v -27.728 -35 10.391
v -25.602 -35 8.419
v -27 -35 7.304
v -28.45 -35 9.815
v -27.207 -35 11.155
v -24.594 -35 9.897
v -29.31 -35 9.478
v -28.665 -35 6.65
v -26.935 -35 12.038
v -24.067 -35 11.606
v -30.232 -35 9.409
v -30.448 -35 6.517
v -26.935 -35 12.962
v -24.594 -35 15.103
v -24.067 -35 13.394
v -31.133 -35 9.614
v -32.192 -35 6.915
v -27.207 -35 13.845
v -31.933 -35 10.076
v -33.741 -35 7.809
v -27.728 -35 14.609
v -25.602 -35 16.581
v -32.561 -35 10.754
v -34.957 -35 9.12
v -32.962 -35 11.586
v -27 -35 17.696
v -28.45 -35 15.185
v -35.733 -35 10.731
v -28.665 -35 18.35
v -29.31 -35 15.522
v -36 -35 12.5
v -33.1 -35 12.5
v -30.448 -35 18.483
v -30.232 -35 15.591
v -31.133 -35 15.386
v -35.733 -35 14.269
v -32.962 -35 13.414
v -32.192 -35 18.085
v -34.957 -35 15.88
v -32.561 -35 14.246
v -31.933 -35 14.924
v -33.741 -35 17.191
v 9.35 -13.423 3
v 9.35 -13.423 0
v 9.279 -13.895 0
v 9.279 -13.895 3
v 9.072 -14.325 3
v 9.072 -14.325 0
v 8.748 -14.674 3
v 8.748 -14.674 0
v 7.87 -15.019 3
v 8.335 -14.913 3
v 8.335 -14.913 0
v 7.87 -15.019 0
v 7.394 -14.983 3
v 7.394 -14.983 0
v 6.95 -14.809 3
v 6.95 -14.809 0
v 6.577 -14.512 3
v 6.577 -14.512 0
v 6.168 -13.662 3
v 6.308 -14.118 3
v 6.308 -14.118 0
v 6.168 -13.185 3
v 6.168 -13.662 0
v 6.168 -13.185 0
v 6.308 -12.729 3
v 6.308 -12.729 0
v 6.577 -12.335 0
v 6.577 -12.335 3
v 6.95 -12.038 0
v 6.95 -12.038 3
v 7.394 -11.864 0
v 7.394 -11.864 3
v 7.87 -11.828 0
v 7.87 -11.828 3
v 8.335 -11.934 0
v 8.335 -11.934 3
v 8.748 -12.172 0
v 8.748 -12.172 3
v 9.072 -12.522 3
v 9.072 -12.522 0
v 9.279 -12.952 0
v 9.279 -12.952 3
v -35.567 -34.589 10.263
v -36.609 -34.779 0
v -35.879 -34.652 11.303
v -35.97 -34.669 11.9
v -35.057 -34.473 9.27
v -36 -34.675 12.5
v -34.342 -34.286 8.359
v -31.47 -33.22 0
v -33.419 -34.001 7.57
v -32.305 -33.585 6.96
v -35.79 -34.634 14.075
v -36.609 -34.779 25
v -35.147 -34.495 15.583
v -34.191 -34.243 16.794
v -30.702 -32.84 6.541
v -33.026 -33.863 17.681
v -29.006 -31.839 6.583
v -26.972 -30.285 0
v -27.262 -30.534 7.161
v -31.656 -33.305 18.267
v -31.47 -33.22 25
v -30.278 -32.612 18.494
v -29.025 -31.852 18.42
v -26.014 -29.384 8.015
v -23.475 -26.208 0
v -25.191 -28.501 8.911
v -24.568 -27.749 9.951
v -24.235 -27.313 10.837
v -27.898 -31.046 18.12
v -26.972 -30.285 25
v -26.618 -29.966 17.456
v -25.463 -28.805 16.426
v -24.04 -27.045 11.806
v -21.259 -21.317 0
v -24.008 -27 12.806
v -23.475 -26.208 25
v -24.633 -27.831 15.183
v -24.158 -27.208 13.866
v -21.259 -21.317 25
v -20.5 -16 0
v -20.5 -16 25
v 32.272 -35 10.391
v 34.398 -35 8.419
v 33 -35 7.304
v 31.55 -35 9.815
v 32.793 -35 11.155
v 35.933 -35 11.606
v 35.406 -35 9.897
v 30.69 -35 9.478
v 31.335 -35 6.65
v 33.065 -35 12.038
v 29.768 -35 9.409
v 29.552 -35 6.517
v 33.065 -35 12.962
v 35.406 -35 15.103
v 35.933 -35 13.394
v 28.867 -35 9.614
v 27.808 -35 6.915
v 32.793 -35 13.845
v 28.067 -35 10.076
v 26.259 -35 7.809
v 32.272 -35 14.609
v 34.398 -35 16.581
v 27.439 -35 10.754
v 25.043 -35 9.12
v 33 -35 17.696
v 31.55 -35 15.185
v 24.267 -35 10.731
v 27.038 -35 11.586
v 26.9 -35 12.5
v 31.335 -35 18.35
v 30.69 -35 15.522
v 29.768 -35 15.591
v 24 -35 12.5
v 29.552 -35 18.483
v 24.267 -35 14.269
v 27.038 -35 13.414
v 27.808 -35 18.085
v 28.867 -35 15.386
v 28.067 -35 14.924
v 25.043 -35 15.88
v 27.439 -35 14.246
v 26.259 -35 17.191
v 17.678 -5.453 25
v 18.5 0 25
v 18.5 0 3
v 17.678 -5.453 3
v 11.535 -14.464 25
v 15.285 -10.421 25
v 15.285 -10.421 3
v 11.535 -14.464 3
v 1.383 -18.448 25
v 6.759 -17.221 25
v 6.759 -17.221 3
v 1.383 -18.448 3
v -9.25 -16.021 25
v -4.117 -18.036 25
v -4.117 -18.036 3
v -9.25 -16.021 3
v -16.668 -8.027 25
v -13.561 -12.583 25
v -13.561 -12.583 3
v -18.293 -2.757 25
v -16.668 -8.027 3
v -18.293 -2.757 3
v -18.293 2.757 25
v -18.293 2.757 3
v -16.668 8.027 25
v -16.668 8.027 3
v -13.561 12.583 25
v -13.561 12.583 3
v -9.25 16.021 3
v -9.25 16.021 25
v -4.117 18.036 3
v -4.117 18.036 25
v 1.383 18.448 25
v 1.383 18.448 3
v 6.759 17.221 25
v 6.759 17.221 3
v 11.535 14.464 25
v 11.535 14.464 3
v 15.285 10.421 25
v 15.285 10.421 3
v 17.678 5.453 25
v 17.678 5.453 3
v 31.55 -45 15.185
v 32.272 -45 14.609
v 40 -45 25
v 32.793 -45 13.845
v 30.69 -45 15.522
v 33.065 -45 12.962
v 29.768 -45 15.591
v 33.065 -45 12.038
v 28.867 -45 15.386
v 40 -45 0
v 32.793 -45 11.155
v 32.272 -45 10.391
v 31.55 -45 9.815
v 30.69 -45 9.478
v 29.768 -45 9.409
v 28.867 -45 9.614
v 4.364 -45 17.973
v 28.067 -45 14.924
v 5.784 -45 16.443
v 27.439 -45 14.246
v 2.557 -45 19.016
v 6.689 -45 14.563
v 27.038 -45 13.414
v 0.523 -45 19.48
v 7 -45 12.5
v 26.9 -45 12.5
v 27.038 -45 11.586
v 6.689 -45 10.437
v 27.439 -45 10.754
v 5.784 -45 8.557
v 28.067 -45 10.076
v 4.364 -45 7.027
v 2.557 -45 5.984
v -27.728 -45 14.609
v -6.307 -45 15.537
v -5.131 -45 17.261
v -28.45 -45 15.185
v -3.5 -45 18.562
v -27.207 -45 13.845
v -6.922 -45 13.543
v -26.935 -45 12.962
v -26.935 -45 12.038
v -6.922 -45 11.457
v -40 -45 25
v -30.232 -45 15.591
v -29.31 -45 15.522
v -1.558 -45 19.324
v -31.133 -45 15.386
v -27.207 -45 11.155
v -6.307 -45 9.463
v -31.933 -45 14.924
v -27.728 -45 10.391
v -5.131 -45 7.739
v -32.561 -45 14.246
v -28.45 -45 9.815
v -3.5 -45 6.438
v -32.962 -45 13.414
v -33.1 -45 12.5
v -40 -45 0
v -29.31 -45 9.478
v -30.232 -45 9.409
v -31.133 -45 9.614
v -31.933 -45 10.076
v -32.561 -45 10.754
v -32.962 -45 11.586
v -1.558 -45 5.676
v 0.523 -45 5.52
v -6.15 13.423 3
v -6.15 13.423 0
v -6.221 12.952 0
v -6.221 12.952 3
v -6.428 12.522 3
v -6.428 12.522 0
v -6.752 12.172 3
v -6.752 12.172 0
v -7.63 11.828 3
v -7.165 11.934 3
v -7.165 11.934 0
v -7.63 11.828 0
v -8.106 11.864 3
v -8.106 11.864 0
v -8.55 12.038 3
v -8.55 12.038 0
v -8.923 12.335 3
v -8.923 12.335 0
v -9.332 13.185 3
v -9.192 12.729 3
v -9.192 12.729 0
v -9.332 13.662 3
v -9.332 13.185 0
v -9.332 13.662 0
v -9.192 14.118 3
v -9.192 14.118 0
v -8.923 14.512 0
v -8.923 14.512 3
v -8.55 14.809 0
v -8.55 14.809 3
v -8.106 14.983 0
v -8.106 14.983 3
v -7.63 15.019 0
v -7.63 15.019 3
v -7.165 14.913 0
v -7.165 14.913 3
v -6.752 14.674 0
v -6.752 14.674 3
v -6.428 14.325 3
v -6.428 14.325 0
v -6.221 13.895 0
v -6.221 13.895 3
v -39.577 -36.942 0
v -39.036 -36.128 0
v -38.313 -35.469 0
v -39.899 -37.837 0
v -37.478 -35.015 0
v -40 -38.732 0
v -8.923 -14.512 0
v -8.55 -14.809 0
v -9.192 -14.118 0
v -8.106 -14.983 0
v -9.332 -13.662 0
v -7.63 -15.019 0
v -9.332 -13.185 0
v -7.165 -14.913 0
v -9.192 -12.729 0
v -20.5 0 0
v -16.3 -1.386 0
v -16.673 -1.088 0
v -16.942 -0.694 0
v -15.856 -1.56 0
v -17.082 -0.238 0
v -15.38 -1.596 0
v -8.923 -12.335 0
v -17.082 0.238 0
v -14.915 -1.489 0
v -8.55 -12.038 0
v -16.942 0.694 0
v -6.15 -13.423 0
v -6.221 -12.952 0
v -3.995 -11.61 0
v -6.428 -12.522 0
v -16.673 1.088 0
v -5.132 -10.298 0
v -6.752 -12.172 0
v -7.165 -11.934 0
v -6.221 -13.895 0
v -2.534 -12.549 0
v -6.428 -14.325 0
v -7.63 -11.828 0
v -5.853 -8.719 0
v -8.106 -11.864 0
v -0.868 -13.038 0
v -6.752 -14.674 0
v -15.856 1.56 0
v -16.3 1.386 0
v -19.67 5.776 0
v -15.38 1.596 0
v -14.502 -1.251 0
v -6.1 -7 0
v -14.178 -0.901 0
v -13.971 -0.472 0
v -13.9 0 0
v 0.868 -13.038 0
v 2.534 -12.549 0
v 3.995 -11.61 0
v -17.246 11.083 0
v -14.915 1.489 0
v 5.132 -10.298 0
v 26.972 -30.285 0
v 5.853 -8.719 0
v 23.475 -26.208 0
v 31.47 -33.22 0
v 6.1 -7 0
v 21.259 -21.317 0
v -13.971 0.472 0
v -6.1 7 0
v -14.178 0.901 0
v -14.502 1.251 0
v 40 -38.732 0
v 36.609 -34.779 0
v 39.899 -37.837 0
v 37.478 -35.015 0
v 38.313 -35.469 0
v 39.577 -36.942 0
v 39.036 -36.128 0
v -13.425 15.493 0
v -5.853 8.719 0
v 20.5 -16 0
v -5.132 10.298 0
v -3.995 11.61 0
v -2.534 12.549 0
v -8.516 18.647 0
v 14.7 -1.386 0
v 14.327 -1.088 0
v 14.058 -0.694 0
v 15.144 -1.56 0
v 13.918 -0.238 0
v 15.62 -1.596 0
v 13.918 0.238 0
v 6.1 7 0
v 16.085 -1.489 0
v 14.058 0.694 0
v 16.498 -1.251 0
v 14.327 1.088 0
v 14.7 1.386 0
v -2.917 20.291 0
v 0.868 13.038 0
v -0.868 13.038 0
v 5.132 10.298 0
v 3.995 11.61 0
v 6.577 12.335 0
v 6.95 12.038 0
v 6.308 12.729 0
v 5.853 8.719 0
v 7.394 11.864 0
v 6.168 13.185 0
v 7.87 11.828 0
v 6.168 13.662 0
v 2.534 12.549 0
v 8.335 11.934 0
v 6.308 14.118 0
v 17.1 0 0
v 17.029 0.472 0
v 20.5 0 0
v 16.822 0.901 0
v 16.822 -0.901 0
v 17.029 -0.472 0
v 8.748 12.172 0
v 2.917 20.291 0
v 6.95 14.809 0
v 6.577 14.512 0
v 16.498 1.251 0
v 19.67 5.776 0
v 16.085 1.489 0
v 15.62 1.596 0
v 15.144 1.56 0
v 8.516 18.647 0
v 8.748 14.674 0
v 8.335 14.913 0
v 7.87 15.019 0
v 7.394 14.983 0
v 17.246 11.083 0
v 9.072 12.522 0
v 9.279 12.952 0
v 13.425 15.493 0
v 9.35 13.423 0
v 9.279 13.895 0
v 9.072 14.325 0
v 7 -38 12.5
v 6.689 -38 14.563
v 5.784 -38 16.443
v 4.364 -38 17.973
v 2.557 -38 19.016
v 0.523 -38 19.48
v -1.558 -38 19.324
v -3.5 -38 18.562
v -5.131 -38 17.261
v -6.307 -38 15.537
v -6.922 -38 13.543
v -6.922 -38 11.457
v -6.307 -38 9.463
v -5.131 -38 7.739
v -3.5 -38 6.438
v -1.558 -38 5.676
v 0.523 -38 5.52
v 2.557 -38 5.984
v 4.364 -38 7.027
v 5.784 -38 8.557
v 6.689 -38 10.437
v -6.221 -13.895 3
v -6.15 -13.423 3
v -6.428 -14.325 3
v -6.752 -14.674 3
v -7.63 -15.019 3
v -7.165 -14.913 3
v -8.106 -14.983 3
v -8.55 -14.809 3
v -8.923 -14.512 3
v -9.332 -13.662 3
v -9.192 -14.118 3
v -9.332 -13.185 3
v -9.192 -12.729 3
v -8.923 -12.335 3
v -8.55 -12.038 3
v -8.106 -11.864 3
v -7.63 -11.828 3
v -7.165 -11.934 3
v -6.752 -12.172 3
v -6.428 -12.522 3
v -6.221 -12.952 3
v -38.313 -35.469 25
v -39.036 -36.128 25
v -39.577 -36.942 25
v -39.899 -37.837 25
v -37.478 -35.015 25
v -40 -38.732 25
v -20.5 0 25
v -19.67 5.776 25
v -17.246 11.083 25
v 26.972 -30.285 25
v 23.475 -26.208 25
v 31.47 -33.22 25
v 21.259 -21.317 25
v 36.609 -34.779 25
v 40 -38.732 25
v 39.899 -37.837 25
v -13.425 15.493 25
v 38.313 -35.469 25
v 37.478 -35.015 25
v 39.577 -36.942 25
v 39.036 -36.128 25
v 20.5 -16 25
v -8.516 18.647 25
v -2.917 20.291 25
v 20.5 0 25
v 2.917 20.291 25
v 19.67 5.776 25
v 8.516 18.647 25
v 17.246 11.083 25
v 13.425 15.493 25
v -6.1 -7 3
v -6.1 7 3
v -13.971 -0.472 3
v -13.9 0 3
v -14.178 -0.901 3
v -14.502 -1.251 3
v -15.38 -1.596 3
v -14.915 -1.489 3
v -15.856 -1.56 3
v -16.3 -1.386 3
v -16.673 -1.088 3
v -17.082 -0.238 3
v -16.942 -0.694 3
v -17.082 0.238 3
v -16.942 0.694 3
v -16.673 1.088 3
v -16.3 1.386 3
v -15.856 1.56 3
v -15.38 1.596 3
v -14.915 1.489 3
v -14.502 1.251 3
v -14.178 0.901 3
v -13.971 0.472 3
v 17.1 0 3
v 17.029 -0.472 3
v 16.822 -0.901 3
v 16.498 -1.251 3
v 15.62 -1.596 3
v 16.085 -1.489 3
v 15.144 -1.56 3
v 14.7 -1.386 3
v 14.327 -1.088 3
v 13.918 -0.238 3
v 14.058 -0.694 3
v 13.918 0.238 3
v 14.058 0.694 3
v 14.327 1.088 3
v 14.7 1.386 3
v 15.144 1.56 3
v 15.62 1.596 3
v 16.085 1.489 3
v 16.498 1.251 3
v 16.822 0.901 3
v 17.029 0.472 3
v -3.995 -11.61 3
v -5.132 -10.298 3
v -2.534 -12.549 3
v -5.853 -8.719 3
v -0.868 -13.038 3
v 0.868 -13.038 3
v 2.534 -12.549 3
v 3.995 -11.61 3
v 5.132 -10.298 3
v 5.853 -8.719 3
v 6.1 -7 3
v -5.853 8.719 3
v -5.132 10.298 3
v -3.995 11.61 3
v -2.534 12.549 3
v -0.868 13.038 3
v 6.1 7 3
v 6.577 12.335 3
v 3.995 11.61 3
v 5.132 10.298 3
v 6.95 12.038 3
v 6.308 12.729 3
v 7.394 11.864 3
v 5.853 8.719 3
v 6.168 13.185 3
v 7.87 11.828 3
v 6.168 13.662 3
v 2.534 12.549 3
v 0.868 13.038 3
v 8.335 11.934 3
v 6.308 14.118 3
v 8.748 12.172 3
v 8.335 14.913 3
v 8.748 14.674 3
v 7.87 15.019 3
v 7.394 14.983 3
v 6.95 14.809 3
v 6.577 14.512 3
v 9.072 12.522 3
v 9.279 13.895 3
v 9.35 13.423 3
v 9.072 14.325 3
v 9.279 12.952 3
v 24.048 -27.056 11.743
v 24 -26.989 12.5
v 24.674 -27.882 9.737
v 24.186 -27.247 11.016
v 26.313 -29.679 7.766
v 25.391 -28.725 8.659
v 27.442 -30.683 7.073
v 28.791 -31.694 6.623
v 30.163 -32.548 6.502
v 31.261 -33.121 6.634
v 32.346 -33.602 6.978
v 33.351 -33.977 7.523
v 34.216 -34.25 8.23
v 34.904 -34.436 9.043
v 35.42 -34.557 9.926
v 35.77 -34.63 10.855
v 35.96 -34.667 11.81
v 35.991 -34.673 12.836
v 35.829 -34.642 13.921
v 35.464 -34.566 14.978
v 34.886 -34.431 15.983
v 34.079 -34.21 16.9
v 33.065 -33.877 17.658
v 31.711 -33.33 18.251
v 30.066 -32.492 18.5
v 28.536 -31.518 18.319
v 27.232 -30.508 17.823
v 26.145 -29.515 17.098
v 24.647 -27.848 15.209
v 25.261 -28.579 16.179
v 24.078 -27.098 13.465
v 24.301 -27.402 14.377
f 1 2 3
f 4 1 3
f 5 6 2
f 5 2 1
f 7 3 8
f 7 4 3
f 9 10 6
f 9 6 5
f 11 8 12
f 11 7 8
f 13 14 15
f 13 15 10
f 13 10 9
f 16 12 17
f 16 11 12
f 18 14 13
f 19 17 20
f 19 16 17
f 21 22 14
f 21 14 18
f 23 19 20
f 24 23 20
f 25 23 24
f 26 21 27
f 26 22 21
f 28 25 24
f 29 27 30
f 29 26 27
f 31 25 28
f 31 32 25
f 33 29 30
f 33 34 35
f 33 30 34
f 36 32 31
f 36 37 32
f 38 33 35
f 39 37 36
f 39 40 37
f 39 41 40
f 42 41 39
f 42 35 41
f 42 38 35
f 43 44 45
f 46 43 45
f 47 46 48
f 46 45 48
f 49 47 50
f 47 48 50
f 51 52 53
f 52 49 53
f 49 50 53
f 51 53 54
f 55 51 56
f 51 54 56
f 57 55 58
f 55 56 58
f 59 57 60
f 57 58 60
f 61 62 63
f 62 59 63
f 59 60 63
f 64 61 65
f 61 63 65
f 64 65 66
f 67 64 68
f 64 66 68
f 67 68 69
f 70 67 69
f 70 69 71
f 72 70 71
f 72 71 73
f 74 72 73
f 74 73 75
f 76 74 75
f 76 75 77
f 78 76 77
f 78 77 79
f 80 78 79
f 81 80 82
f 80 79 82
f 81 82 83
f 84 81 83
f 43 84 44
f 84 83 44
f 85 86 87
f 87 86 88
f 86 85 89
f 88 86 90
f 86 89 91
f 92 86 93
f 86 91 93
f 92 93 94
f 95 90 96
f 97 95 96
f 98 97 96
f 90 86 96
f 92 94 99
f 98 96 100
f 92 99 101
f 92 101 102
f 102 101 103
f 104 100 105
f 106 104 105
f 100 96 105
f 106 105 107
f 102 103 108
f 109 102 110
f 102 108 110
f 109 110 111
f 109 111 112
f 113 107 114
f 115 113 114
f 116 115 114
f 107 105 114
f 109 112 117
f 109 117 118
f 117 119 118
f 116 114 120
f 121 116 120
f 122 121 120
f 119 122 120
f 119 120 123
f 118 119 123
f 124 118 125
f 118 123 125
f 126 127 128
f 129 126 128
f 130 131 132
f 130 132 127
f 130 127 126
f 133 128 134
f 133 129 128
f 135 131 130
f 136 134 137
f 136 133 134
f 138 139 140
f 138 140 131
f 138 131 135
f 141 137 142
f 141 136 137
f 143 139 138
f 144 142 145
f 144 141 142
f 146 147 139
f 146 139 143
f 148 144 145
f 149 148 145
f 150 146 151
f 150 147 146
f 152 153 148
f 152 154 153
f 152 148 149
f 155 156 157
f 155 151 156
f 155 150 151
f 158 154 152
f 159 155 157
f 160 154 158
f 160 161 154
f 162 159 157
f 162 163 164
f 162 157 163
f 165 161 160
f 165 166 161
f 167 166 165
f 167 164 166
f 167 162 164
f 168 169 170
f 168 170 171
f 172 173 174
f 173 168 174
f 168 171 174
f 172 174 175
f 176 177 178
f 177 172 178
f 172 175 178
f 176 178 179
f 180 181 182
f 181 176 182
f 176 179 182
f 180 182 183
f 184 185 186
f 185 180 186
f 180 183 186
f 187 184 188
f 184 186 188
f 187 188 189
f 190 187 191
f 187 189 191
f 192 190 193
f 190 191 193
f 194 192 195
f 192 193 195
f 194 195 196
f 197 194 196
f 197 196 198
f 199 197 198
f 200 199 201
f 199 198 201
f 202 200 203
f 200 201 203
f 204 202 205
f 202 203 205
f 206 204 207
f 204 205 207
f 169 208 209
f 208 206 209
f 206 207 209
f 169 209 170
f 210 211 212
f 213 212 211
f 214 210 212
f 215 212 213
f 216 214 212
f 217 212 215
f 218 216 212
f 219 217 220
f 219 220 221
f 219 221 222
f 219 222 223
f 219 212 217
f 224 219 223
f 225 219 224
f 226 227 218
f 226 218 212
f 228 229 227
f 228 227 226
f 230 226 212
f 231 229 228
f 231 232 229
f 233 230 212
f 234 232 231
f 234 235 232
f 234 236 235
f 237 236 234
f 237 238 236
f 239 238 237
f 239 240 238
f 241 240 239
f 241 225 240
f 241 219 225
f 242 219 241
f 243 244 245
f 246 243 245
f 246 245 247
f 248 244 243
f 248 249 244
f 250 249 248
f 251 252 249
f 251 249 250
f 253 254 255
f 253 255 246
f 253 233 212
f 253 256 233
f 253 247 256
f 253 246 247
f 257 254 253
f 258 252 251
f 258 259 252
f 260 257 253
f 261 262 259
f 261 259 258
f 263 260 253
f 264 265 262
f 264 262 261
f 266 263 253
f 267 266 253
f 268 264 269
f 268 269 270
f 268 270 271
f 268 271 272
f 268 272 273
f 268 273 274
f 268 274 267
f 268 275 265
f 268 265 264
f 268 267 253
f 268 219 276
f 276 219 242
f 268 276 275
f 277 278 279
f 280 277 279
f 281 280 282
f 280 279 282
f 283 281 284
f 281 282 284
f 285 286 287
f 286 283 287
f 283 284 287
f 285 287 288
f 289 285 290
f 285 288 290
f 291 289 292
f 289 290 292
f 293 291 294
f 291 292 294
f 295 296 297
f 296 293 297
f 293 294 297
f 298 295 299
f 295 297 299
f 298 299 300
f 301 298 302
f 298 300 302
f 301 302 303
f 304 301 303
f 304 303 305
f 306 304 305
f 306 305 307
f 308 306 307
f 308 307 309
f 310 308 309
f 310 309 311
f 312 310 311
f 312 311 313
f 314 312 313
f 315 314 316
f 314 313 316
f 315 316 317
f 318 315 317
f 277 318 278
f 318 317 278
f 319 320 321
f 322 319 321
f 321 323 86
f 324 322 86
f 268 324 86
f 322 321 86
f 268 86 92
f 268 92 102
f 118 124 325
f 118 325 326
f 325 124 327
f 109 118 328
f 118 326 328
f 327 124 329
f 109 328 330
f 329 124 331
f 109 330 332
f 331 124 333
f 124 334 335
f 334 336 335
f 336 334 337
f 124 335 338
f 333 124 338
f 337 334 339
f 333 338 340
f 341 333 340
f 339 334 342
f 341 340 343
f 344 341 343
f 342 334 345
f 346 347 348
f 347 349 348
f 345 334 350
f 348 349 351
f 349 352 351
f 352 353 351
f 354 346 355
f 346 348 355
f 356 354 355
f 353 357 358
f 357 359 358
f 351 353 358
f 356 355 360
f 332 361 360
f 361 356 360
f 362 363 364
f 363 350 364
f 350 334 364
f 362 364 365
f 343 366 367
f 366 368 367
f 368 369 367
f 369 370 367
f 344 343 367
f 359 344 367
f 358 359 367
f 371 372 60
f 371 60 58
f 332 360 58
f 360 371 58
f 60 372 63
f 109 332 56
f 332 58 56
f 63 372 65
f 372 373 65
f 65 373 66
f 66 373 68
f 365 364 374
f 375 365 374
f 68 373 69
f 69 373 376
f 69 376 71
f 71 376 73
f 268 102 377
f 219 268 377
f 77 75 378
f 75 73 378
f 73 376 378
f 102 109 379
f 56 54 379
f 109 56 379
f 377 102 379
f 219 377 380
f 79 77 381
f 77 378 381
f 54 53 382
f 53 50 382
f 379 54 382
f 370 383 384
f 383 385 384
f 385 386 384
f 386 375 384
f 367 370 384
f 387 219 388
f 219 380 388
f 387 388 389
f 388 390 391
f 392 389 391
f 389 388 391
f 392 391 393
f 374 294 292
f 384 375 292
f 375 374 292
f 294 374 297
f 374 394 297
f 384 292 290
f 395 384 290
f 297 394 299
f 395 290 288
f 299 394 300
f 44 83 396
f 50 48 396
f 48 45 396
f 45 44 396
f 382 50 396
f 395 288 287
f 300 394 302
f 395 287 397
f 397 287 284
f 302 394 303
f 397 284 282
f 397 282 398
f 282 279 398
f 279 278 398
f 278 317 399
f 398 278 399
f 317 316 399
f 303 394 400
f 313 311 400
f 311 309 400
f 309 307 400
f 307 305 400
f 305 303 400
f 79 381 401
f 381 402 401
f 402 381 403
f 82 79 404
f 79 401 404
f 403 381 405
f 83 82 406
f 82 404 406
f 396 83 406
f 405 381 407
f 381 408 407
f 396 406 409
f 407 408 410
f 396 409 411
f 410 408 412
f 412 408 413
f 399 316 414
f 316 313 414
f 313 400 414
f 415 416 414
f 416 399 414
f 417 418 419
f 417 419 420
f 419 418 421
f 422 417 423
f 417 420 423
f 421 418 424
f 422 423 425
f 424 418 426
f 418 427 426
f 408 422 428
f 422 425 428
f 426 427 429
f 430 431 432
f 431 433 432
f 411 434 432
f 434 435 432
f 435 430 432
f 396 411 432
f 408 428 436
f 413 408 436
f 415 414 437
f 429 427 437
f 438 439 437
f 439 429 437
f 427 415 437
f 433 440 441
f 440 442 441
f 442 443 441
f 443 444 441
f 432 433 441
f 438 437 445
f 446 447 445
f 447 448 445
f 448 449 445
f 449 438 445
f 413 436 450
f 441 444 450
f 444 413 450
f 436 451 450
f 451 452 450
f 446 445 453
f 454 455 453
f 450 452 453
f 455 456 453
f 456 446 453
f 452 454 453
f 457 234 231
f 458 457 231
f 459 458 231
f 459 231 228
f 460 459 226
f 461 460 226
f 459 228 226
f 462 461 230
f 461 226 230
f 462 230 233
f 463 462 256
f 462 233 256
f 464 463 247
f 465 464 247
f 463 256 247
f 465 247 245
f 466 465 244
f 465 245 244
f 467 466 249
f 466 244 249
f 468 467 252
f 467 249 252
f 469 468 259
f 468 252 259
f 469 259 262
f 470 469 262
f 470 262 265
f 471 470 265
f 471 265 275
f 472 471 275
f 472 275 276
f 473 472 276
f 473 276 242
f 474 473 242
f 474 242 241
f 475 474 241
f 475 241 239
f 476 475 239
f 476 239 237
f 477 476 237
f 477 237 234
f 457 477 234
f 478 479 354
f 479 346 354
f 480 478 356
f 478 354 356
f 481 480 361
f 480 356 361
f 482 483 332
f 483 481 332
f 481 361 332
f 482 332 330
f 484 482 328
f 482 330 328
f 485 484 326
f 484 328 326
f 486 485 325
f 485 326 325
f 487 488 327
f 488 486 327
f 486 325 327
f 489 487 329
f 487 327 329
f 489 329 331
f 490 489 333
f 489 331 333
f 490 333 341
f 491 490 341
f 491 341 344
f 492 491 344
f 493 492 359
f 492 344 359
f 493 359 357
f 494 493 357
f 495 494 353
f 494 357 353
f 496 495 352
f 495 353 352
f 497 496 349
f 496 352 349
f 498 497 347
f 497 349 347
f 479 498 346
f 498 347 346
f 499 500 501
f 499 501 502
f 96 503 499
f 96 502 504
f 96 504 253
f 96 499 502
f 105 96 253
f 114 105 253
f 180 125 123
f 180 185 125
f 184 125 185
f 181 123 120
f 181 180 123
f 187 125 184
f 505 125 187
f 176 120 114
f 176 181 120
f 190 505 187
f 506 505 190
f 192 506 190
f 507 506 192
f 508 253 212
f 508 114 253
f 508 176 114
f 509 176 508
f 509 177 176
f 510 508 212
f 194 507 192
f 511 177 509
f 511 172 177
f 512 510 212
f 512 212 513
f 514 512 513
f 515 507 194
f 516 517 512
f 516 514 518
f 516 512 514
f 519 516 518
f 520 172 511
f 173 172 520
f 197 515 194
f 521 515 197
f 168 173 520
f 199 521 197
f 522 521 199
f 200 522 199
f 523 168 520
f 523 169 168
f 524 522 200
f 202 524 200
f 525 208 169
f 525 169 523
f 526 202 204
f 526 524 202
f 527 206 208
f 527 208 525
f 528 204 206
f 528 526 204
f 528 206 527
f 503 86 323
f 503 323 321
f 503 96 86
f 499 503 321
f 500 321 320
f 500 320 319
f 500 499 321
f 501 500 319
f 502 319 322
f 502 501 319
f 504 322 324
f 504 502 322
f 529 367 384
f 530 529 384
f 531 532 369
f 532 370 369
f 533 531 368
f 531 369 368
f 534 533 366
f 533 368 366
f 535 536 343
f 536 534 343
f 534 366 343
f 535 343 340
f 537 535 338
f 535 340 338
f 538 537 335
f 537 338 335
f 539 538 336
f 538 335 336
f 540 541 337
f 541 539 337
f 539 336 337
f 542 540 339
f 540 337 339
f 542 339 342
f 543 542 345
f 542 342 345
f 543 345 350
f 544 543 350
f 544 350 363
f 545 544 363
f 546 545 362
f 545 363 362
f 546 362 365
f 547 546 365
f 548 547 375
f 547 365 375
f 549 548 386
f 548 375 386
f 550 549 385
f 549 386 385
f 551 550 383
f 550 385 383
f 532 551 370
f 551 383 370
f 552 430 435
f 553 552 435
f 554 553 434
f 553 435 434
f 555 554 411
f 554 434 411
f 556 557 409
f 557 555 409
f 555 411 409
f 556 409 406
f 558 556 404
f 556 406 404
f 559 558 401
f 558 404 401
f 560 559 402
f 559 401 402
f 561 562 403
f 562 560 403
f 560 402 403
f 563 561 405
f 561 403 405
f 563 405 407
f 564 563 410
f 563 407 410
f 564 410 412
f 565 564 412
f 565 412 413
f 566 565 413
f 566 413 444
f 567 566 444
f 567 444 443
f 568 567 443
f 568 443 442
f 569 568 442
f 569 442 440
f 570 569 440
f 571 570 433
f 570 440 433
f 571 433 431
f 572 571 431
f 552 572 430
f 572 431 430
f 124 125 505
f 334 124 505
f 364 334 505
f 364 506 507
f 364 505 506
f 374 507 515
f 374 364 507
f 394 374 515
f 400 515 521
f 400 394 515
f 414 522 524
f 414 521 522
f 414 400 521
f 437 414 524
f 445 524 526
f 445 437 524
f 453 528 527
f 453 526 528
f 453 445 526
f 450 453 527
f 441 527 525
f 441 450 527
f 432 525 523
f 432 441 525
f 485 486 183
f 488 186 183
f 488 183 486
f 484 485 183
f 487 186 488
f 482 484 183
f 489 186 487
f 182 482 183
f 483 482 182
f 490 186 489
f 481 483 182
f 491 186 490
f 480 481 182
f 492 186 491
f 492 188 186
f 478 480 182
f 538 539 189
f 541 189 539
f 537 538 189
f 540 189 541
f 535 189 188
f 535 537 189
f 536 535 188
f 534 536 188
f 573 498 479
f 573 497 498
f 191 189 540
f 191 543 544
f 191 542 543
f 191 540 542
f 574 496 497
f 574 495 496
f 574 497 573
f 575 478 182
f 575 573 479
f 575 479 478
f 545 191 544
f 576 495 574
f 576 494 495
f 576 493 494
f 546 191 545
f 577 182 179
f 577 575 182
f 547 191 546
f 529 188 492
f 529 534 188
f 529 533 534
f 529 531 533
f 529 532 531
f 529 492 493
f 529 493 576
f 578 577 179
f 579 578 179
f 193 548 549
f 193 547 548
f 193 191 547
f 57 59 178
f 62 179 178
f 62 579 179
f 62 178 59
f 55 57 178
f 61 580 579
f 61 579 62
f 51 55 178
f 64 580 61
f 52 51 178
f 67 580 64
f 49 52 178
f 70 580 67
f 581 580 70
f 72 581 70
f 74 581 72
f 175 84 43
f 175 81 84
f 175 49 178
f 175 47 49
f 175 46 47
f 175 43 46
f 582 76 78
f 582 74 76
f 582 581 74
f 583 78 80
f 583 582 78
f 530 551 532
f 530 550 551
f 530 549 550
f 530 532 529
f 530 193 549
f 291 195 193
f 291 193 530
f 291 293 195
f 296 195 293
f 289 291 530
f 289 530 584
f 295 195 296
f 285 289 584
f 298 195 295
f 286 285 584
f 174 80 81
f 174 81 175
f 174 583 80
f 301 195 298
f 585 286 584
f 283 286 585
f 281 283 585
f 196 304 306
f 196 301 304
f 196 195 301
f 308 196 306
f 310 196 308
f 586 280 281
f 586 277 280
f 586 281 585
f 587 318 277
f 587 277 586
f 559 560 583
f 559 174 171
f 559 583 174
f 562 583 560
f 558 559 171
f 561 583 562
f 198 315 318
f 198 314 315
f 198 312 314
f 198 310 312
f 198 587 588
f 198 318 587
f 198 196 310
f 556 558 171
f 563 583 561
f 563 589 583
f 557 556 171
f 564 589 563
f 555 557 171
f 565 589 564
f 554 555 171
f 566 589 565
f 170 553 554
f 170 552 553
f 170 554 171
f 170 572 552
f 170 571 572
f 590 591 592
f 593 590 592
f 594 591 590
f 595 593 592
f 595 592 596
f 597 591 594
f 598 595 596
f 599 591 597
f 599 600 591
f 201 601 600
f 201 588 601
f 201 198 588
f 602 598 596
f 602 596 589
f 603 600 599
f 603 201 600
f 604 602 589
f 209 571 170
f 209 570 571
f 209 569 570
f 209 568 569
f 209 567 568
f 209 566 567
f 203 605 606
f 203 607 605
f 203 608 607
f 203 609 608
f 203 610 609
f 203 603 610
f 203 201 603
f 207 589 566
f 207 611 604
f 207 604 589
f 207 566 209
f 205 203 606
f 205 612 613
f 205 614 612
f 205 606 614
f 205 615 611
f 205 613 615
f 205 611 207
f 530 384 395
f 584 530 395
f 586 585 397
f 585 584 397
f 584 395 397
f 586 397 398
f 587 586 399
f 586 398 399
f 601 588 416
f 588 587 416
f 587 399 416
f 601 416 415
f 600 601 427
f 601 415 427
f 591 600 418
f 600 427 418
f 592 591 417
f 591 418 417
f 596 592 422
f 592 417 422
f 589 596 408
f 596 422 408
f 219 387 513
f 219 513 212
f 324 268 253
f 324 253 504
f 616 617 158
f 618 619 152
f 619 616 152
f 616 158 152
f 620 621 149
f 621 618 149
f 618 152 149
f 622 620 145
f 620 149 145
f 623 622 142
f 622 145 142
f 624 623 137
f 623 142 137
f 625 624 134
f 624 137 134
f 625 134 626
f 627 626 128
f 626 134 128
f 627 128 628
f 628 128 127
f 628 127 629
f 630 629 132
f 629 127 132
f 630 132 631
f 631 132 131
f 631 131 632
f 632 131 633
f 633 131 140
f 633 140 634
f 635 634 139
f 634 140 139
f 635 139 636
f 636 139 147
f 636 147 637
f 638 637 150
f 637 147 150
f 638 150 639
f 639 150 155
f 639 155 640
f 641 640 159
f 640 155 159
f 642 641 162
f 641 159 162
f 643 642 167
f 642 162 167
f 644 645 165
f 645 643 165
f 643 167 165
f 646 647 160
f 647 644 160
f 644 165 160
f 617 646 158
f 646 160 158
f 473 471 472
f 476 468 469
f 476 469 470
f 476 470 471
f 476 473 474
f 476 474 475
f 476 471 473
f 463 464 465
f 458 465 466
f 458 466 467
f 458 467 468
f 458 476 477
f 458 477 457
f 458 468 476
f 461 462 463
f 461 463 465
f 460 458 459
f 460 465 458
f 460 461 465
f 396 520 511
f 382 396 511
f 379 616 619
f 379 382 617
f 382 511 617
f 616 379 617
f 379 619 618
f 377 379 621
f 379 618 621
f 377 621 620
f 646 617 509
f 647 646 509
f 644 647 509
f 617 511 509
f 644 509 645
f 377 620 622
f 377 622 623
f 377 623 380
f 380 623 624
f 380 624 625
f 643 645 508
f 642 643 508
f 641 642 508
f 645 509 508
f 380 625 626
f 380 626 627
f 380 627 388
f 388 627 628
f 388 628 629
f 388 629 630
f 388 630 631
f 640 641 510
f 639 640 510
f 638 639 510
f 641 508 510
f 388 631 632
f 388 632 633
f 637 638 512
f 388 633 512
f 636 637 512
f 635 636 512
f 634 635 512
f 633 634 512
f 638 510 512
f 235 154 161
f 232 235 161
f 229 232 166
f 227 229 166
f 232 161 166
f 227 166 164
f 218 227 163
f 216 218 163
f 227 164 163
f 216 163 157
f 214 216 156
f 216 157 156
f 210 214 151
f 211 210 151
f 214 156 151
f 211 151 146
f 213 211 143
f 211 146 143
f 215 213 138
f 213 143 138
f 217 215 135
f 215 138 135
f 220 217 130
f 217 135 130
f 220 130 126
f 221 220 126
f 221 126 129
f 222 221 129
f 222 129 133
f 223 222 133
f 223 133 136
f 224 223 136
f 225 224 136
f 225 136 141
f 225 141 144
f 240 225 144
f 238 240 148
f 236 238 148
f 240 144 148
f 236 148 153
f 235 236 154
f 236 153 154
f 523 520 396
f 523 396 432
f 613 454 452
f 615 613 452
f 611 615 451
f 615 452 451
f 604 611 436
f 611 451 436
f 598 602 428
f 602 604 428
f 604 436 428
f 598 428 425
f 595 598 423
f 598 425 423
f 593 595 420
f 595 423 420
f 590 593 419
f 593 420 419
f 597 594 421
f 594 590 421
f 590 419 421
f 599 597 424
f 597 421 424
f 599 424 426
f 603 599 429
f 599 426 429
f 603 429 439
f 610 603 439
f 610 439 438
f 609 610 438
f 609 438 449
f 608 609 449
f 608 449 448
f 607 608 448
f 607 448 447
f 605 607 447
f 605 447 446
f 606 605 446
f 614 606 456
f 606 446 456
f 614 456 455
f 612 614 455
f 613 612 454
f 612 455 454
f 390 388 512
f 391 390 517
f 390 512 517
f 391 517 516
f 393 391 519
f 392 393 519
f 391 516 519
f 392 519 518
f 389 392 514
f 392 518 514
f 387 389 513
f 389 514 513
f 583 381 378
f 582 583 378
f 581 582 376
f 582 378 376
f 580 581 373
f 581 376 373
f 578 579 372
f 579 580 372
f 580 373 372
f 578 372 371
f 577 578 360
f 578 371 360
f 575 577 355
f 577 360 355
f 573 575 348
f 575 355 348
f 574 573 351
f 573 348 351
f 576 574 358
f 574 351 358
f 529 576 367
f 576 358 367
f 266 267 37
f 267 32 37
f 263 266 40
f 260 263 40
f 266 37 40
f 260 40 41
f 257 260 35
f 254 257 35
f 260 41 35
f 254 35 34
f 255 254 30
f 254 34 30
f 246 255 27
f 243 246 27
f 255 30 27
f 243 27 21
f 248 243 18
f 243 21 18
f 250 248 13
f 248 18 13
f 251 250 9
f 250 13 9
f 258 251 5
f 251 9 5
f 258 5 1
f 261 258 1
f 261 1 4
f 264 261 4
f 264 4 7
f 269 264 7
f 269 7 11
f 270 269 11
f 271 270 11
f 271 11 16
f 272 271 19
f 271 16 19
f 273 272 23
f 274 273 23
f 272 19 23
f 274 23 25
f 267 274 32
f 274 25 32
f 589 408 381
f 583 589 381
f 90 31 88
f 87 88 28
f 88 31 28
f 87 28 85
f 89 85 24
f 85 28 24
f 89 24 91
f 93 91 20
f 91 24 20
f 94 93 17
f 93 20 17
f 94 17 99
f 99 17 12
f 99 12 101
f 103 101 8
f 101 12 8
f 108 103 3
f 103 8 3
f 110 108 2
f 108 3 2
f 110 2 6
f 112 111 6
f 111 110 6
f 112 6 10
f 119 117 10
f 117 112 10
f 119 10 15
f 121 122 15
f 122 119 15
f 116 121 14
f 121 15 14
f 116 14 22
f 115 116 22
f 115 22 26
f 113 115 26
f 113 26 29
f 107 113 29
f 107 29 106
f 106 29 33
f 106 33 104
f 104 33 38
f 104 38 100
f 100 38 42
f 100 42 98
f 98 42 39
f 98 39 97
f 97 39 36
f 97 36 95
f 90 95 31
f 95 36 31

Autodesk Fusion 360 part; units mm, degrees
sketch "Sketch1" plane through (0, 0, 0) normal (0, 0, 1) x (1, 0, 0)
  circle A0 centre (0, 0) radius 15.5 construction
  circle A1 centre (0, 0) radius 18.5
  circle A2 centre (0, 0) radius 20.5
  line L0 (-18.5, 0) -> (18.5, 0) construction
  circle A3 centre (-15.5, 0) radius 1.6
  circle A4 centre (15.5, 0) radius 1.6
  circle A5 centre (7.75, -13.4234) radius 1.6
  circle A6 centre (-7.75, -13.4234) radius 1.6
  circle A7 centre (7.75, 13.4234) radius 1.6
  circle A8 centre (-7.75, 13.4234) radius 1.6
  line L1 (0, 18.5) -> (0, -40) construction
  line L2 (40, -45) -> (-40, -45)
  line L3 (-40, -45) -> (-40, -35)
  line L4 (-40, -35) -> (40, -35)
  line L5 (40, -35) -> (40, -45)
  line L6 (40, -45) -> (-40, -35) construction
  line L7 (-40, -45) -> (40, -35) construction
  line L8 (-20.5, -35) -> (-20.5, 0)
  line L9 (20.5, -35) -> (20.5, 0)
  circle A9 centre (0, 7) radius 6.1
  circle A10 centre (0, -7) radius 6.1
  line L10 (-6.1, -7) -> (-6.1, 7)
  line L11 (6.1, 7) -> (6.1, -7)
  dimension "d1" = 31
  dimension "d2" = 37
  dimension "d3" = 2
  dimension "d4" = 3.2
  dimension "d5" = 3.2
  dimension "d6" = 3.2
  dimension "d7" = 3.2
  dimension "d8" = 3.2
  dimension "d9" = 3.2
  dimension "d10" = 15.5
  dimension "d11" = 15.5
  dimension "d12" = 15.5
  dimension "d13" = 15.5
  dimension "d14" = 15.5
  dimension "d21" = 10
  dimension "d22" = 80
  dimension "d32" = 12.2
  dimension "d33" = 7
  dimension "d52" = 35
extrude "Extrude1" add sketch "Sketch1" along normal blind 3 contours A1
extrude "Extrude2" add sketch "Sketch1" along normal blind 25 contours A2 | A2 L4 L8 L9 | L2 L3 L4 L5
sketch "Sketch6" plane through (0, -35, 0) normal (0, 1, 0) x (-1, 0, 0)
  line L0 (20.5, 0) -> (40, 0)
  line L1 (40, 0) -> (40, 25)
  line L2 (40, 25) -> (20.5, 25)
  line L3 (20.5, 25) -> (20.5, 0)
  line L4 (-40, 0) -> (-20.5, 0)
  line L5 (-20.5, 0) -> (-20.5, 25)
  line L6 (-20.5, 25) -> (-40, 25)
  line L7 (-40, 25) -> (-40, 0)
  line L8 (-40, 12.5) -> (40, 12.5) construction
  circle A0 centre (-30, 12.5) radius 3.1
  line L9 (0, 0) -> (0, 42.7428) construction
  circle A1 centre (30, 12.5) radius 3.1
  circle A2 centre (30, 12.5) radius 6
  circle A3 centre (-30, 12.5) radius 6
  dimension "d42" = 6.2
  dimension "d43" = 6.2
  dimension "d44" = 30
  dimension "d45" = 30
  dimension "d46" = 12
  dimension "d47" = 12
fillet "Fillet2" radius 19 2 edges at (20.5, -35, 12.5) (-20.5, -35, 12.5)
extrude "Extrude3" cut sketch "Sketch6" against normal through all contours A0 | A1
extrude "Extrude4" cut sketch "Sketch6" along normal through all contours A0 | A1 | A2 | A3
fillet "Fillet3" radius 4 2 edges at (40, -35, 12.5) (-40, -35, 12.5)
sketch "Sketch7" plane through (0, -45, 0) normal (0, -1, 0) x (1, 0, 0)
  circle A0 centre (30, 12.5) radius 3.1
  circle A1 centre (-30, 12.5) radius 3.1
  line L0 (-40, 0) -> (40, 0)
  line L1 (40, 0) -> (40, 25)
  line L2 (40, 25) -> (-40, 25)
  line L3 (-40, 25) -> (-40, 0)
  line L4 (-30, 12.5) -> (30, 12.5) construction
  circle A2 centre (0, 12.5) radius 7
  dimension "d55" = 14
extrude "Extrude7" cut sketch "Sketch7" against normal blind 7 contours A2
